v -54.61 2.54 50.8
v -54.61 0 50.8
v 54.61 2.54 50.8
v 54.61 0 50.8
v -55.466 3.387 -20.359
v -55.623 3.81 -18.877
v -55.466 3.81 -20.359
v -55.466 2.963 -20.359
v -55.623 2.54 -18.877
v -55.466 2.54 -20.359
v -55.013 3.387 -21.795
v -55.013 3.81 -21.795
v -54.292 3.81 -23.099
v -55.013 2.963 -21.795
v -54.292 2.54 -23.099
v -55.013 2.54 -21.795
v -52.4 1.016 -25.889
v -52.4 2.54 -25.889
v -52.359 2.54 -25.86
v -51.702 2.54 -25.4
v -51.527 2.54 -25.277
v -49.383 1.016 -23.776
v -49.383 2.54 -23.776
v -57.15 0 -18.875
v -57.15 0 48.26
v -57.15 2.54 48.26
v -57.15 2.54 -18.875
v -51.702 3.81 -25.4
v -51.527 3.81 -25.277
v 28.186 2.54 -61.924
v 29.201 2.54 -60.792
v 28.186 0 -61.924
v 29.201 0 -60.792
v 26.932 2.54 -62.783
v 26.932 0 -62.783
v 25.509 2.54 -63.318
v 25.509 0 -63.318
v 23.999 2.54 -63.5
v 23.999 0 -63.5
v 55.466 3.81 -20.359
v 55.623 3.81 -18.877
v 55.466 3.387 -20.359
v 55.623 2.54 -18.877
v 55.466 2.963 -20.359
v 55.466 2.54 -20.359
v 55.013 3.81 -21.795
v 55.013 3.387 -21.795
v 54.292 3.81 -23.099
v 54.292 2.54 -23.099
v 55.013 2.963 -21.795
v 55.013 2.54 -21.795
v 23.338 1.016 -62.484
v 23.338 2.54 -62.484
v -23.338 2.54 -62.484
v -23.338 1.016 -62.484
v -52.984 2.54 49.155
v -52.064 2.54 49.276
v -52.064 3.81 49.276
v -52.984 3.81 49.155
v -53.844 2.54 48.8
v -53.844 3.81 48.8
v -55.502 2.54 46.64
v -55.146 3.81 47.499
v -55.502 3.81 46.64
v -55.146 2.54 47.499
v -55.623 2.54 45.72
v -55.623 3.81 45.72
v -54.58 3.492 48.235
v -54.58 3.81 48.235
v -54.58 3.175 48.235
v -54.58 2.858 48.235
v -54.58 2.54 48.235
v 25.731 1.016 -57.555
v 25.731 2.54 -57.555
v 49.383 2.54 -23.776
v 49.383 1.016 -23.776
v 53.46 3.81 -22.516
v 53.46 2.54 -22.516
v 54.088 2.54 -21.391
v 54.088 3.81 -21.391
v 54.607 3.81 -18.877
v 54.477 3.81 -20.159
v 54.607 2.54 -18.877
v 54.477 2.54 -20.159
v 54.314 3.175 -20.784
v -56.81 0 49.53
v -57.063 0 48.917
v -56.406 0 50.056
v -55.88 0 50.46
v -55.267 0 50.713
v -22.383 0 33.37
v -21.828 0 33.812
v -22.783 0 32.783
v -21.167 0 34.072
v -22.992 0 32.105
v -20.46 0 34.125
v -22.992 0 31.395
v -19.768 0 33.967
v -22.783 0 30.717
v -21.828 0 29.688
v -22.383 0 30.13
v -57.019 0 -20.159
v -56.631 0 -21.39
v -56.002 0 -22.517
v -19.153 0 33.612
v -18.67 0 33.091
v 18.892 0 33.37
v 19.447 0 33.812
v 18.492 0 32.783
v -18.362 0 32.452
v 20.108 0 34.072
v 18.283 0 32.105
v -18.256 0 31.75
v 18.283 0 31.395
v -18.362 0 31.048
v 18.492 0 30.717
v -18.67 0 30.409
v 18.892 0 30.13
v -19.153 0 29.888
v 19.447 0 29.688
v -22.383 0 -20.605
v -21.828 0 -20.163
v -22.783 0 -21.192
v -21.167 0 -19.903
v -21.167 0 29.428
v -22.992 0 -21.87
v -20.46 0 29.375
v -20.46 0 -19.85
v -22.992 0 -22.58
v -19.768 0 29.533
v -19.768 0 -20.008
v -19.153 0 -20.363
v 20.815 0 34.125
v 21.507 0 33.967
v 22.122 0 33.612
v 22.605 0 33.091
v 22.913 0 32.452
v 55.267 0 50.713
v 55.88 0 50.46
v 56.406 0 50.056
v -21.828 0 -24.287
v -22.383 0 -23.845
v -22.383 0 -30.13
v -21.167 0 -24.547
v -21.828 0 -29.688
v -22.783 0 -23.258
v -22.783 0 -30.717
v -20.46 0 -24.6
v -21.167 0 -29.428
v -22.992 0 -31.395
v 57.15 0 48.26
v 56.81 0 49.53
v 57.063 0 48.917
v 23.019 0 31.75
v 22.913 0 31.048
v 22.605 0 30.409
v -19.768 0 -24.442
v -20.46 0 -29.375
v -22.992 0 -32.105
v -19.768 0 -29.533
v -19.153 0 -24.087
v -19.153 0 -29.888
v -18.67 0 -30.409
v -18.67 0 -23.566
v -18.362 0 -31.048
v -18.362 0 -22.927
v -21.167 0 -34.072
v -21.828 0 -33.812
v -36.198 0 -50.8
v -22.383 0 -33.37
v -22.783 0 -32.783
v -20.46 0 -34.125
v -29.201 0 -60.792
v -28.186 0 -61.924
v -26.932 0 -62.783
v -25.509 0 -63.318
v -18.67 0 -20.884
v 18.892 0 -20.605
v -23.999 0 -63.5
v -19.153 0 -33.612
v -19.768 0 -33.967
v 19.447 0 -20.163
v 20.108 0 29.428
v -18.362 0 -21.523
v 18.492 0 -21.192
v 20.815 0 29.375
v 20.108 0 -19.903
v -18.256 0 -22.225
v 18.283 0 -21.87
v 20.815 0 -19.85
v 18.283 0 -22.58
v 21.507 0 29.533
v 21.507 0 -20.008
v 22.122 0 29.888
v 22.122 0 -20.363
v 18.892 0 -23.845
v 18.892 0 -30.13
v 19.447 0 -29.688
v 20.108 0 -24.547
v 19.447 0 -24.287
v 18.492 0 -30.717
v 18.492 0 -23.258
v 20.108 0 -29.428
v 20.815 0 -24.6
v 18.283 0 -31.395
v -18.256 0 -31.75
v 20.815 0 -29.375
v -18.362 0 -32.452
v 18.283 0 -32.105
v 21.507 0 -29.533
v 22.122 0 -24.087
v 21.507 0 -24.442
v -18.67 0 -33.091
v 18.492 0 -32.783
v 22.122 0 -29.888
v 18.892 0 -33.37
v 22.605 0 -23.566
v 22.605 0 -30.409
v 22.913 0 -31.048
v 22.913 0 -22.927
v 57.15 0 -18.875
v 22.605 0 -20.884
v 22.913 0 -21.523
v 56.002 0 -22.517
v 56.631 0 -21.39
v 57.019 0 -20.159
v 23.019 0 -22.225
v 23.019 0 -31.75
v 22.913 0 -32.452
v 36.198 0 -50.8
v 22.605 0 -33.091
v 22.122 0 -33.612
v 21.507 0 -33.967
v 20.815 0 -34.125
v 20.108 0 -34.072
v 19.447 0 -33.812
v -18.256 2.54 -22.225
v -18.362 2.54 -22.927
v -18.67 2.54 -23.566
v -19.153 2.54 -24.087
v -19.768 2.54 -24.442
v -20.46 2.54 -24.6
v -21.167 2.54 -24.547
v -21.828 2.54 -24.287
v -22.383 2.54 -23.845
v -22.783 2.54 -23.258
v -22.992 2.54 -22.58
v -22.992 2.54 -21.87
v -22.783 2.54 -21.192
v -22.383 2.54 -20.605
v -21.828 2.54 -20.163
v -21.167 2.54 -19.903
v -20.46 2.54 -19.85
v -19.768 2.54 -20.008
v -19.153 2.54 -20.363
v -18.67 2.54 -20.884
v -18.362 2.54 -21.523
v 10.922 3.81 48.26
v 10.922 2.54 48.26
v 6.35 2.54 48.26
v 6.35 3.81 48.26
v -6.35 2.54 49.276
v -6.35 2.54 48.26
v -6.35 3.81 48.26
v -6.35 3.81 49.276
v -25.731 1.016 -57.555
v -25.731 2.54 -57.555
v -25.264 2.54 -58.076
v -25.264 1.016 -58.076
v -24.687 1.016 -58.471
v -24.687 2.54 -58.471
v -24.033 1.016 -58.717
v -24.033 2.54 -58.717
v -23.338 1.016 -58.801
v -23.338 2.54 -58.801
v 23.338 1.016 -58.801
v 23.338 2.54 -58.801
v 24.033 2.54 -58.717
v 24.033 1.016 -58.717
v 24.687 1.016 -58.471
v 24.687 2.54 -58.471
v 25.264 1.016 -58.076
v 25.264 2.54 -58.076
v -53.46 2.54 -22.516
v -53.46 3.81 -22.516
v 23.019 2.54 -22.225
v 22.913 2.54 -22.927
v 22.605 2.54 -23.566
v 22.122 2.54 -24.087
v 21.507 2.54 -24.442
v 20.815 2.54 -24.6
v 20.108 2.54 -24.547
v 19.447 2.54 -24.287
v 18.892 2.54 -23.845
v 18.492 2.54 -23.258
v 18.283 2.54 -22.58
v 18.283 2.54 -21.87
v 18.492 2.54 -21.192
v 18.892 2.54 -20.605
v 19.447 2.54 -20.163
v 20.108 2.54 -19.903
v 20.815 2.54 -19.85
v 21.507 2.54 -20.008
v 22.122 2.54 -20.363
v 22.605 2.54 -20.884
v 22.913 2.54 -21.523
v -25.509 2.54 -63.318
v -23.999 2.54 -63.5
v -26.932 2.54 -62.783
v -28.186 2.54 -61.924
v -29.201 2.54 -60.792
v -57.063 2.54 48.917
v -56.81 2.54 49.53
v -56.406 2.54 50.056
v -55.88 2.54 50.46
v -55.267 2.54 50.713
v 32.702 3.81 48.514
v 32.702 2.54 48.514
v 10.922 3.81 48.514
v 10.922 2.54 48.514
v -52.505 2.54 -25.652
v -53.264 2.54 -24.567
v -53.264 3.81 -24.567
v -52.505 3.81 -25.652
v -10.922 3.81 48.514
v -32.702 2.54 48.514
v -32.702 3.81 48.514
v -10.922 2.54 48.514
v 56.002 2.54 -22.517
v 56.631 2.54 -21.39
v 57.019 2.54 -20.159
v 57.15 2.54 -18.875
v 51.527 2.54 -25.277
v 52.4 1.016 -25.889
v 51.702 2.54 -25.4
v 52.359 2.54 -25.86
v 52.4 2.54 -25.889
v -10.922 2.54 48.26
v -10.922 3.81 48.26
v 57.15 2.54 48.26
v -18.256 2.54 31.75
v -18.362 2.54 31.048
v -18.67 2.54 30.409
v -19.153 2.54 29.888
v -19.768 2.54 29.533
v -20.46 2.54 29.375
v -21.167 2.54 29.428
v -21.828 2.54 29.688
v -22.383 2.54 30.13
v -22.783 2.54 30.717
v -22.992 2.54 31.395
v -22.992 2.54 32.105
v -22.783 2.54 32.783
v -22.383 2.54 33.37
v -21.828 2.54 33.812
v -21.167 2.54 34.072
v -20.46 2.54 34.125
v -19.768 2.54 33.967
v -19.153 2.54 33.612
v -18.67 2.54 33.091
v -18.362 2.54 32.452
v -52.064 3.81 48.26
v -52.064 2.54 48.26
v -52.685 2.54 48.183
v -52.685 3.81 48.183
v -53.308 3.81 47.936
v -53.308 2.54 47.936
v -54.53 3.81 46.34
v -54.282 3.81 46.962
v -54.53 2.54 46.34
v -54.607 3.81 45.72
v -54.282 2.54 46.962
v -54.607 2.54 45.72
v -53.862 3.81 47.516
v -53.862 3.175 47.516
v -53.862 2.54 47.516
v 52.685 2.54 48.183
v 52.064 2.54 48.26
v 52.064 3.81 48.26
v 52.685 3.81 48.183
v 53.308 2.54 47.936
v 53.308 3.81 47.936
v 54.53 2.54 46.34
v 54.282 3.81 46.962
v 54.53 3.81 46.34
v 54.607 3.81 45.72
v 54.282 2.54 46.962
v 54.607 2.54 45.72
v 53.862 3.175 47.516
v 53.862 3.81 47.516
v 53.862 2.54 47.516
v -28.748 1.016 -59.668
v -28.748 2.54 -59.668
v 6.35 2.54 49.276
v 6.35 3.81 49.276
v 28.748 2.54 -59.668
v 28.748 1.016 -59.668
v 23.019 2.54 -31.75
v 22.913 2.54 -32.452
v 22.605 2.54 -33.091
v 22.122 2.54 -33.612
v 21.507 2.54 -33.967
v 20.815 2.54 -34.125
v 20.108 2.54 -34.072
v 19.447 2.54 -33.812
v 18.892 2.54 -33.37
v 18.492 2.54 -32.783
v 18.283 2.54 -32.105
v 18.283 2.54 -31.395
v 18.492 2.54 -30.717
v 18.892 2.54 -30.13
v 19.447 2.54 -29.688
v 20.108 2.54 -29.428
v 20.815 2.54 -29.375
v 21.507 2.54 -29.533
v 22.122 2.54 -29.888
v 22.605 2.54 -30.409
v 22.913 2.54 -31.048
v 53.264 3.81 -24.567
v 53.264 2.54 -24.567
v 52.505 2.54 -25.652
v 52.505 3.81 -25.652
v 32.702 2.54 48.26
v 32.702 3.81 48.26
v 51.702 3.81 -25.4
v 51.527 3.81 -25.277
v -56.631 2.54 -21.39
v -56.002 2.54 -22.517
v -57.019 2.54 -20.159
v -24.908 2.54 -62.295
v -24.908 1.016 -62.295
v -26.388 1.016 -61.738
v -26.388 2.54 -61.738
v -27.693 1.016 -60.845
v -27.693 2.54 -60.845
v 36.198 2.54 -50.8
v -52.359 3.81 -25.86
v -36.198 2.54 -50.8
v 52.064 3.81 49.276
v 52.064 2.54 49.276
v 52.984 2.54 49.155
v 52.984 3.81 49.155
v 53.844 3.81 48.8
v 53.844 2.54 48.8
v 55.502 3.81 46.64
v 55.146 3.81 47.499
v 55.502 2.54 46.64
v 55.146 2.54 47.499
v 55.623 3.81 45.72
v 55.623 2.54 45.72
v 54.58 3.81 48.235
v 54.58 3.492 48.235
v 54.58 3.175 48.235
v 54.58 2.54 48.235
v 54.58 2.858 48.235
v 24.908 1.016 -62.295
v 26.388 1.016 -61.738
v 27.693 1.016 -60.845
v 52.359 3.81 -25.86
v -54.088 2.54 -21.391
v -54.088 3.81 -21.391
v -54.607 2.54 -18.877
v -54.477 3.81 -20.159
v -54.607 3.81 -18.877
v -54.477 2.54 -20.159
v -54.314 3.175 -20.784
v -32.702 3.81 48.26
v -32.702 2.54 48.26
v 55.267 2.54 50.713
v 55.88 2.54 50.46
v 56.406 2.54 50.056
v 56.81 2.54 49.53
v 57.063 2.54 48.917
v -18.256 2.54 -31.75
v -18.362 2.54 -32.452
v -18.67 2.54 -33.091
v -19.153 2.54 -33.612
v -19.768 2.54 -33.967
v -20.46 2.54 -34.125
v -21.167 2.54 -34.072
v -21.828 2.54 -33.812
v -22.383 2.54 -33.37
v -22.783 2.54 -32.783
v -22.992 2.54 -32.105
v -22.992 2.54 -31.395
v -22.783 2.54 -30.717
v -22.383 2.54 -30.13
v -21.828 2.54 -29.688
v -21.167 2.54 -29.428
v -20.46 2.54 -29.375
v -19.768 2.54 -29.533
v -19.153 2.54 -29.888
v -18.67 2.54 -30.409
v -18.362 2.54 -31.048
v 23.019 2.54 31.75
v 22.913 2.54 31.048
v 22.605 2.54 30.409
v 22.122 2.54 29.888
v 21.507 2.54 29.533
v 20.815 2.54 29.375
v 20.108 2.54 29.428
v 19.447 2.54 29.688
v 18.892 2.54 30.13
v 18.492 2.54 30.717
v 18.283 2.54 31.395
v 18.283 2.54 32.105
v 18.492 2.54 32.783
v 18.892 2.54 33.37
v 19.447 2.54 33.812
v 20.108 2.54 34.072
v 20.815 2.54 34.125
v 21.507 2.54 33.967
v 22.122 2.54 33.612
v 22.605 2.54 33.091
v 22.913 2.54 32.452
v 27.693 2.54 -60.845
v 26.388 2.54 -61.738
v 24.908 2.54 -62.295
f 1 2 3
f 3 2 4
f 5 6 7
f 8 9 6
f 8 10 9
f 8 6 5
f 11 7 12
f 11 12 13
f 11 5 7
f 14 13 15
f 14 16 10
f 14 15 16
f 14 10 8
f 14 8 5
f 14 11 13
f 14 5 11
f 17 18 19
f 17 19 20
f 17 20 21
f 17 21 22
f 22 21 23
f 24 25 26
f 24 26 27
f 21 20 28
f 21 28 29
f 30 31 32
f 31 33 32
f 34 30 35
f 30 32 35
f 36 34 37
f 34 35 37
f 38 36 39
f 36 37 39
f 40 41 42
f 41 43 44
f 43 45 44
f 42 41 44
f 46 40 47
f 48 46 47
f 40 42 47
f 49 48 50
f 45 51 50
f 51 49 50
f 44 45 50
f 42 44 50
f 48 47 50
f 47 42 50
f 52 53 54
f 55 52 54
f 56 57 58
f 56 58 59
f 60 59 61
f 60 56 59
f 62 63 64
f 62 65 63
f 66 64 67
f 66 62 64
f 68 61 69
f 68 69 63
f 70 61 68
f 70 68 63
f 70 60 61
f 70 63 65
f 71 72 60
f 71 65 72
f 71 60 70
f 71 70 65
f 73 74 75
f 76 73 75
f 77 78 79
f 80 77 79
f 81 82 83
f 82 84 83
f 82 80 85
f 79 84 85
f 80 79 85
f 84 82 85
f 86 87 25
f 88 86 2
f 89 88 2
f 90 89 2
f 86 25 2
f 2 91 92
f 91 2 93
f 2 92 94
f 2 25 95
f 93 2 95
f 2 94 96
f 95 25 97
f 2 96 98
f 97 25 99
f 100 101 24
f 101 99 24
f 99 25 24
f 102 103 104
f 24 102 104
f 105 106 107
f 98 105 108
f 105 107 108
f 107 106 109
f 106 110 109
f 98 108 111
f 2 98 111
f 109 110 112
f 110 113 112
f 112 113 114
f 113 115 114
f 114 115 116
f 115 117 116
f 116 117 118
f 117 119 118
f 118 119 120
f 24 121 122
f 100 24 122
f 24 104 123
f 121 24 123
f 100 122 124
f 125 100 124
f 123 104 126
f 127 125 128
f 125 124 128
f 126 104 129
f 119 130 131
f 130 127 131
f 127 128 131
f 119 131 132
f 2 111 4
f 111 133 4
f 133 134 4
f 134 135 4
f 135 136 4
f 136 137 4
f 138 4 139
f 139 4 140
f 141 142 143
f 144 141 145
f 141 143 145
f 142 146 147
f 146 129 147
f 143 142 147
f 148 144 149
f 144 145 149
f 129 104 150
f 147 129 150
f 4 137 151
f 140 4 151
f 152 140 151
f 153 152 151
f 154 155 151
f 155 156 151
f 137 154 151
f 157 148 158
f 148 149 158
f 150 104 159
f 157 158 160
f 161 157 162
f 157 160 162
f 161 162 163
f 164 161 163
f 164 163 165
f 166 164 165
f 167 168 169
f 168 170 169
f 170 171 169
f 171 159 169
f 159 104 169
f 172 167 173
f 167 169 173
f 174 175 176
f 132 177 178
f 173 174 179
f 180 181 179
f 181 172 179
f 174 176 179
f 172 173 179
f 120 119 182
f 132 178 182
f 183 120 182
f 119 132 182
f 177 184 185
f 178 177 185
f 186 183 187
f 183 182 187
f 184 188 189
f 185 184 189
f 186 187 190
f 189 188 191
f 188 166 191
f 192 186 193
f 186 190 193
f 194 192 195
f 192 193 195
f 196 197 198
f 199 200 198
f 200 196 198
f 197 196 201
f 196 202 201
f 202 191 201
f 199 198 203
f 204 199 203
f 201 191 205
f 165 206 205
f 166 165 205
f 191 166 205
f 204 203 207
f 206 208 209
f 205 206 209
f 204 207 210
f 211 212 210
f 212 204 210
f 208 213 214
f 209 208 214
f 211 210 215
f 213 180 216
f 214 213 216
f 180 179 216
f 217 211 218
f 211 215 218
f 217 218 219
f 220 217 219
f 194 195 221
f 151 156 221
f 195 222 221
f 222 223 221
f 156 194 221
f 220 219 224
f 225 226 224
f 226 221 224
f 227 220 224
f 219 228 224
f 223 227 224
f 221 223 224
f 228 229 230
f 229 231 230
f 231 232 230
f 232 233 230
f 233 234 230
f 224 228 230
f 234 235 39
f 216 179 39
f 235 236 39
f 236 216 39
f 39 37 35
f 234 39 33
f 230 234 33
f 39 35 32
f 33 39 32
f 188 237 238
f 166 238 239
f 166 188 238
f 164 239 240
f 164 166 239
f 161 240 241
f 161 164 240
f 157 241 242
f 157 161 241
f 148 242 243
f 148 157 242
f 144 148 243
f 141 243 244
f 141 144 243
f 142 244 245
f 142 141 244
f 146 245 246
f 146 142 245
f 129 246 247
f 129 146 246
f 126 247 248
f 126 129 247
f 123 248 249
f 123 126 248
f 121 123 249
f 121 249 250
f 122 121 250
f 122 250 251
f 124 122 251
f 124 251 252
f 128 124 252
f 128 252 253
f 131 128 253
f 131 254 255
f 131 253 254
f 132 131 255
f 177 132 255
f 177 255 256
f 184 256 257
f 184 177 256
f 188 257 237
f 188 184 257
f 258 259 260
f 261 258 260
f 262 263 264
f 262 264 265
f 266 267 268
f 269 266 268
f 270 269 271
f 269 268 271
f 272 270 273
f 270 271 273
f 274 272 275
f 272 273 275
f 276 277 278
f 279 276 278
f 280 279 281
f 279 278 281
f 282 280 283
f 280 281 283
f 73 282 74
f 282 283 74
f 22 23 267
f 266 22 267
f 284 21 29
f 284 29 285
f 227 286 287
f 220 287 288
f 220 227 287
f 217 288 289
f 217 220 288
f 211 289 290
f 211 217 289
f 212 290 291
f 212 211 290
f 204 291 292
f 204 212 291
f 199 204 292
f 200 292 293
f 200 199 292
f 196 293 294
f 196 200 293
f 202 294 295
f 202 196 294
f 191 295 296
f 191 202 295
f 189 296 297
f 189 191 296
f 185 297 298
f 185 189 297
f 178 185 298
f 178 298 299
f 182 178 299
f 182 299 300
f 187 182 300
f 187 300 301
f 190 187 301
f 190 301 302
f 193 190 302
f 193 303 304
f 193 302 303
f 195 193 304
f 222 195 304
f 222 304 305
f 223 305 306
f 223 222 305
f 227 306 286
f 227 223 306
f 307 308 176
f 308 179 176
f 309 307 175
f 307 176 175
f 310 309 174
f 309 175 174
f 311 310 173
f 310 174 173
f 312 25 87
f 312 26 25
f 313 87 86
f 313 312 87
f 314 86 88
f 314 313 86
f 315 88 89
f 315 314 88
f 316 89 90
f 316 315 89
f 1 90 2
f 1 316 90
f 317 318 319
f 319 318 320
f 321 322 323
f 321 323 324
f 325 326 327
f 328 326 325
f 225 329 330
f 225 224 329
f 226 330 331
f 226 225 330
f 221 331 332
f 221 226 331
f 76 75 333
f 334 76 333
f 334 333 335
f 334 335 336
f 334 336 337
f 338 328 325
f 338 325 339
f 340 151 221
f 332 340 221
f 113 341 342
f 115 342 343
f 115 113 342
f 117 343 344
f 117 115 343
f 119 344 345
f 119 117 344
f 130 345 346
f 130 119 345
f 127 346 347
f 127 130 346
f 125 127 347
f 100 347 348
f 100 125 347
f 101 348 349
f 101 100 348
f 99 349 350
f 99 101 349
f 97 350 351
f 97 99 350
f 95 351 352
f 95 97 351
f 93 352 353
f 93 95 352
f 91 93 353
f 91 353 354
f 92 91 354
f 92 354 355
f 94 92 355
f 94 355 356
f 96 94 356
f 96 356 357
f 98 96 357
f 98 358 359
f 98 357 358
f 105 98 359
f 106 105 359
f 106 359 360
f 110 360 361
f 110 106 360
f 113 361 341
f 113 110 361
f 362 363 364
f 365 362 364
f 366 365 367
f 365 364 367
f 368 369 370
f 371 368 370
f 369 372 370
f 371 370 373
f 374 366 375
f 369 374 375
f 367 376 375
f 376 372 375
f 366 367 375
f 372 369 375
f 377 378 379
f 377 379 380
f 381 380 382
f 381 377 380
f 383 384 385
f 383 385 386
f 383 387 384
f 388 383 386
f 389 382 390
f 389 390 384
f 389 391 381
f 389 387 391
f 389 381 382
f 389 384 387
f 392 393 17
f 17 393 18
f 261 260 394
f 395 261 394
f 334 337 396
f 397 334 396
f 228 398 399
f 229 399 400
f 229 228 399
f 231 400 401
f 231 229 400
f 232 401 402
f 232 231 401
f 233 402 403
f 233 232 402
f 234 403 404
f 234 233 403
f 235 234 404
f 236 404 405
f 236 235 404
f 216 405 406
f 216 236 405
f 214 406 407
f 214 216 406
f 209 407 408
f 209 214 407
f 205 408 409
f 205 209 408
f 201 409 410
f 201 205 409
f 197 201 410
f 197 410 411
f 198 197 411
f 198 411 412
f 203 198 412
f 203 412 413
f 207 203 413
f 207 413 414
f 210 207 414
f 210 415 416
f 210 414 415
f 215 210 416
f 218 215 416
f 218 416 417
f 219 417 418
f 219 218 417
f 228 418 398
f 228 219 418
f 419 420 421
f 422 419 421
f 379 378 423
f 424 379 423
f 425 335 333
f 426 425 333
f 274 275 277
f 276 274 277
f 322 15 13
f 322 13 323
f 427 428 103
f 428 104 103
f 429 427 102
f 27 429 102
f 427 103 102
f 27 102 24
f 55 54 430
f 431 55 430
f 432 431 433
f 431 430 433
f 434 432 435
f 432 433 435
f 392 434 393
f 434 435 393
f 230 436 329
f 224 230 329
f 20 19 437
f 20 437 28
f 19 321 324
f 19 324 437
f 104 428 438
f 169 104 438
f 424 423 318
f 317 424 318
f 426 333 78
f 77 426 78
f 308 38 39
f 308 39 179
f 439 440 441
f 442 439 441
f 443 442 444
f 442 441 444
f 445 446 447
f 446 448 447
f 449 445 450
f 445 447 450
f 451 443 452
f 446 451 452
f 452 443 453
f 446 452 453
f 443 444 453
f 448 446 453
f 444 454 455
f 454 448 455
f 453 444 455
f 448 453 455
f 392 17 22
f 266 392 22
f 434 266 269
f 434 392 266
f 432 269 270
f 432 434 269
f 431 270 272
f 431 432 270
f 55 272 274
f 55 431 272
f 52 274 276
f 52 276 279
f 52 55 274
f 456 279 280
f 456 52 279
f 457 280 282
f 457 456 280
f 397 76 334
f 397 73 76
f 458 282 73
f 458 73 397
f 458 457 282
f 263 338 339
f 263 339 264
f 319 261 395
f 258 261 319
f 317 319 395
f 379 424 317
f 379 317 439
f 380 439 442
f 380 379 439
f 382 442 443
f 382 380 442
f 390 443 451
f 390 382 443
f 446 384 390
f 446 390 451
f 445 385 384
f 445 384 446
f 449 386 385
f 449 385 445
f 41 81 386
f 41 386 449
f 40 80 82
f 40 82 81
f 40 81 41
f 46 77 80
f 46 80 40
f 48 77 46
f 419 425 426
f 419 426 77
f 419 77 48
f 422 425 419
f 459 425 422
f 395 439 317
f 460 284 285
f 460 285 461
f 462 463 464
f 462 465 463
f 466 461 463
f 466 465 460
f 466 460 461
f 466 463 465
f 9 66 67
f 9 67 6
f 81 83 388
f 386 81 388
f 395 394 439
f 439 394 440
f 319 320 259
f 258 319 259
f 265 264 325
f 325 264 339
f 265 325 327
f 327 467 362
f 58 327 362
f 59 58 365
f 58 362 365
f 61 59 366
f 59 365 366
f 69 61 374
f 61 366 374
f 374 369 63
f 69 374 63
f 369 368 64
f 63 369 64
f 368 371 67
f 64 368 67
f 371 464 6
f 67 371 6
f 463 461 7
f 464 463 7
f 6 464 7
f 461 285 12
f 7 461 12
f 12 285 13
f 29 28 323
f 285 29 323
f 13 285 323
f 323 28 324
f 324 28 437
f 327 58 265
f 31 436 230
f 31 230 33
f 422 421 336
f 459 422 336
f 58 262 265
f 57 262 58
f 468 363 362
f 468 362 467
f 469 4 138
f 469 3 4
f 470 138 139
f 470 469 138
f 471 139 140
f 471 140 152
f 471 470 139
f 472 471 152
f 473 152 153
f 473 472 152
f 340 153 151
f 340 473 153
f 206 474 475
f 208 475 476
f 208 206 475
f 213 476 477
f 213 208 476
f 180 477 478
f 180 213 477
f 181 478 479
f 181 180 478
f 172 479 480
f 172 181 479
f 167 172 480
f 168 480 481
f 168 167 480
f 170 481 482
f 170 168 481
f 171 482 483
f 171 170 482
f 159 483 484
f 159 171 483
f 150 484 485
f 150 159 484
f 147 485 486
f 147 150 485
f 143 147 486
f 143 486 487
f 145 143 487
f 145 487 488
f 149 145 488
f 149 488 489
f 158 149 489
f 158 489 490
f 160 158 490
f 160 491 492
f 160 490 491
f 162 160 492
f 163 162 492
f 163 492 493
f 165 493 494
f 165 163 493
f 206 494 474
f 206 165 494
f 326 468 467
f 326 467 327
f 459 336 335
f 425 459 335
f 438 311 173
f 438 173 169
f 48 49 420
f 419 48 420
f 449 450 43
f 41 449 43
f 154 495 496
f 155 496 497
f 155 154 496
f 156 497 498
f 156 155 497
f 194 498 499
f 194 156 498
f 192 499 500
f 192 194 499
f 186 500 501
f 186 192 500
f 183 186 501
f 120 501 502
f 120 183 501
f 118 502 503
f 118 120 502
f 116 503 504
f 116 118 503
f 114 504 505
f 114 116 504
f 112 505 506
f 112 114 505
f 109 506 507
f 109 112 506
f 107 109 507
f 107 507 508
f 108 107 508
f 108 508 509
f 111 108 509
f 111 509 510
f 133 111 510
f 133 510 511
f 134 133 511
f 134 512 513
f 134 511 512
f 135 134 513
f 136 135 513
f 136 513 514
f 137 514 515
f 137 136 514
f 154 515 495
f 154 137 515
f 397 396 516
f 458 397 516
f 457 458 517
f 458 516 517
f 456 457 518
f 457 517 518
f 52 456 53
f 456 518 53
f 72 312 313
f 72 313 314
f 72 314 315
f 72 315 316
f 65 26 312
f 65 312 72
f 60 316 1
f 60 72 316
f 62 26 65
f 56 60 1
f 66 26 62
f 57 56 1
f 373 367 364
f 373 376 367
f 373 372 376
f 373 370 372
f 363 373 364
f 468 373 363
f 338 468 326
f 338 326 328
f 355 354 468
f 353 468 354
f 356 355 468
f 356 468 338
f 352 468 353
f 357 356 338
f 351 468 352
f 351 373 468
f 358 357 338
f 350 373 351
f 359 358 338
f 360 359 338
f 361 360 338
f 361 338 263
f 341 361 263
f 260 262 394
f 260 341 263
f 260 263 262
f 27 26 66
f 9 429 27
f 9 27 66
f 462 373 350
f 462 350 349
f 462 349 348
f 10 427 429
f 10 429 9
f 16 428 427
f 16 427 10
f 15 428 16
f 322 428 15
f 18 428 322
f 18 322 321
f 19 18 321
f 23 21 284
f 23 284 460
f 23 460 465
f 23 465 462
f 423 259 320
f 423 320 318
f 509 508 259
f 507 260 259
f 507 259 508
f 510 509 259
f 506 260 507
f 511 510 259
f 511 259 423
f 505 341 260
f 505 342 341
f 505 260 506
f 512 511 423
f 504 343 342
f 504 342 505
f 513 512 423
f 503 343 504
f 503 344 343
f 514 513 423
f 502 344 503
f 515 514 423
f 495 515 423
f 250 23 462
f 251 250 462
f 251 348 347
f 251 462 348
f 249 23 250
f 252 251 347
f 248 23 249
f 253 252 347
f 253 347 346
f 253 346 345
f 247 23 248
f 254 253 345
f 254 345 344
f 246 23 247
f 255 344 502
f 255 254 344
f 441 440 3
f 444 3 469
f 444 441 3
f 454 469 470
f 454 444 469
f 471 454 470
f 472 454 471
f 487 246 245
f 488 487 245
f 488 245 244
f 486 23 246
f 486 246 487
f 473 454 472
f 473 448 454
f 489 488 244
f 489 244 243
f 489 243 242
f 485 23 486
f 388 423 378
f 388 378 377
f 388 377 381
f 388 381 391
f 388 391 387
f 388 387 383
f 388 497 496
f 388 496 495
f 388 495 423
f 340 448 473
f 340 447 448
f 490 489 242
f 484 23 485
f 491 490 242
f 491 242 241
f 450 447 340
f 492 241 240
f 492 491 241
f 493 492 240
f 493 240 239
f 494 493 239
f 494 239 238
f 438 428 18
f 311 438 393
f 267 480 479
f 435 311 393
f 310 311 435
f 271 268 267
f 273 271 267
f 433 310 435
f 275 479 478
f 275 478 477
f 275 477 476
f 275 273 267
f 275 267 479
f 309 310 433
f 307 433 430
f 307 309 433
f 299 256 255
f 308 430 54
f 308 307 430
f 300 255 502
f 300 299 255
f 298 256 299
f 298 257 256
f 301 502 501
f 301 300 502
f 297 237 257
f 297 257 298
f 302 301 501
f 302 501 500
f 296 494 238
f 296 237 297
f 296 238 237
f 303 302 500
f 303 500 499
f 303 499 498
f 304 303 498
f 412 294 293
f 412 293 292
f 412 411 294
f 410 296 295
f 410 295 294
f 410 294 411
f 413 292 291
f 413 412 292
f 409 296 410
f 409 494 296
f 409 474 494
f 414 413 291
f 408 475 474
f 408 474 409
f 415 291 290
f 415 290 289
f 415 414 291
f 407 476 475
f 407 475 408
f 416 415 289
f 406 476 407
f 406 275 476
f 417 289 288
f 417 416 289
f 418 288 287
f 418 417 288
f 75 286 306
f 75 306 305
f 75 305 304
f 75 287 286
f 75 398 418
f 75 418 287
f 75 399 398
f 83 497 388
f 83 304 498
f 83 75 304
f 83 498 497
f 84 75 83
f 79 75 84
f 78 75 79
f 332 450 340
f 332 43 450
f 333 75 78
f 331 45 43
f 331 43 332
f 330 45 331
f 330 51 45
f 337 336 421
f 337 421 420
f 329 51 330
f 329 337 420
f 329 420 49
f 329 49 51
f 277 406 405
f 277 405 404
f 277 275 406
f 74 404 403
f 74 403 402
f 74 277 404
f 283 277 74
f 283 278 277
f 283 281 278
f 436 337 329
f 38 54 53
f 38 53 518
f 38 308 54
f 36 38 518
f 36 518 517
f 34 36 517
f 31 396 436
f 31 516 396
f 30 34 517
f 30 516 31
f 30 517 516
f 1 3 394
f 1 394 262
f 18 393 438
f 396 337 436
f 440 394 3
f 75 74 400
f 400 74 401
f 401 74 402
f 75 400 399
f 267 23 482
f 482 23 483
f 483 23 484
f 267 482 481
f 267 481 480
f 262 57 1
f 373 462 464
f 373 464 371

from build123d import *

# Parameters (mm, degrees)
SKETCH2_W               = 114.3
SKETCH2_H               = 101.6
BOSS_EXTRUDE1_DEPTH     = 2.54
SKETCH3_W               = 19.05
SKETCH3_H               = 38.1
BOSS_EXTRUDE2_DEPTH     = 2.54
TRUCKMOUNTINGHOLES_R    = 2.38125
CUT_EXTRUDE1_DEPTH      = 6.08
FILLET1_R               = 2.54
CUT_EXTRUDE3_DEPTH      = 3.54
CUT_EXTRUDE3_DEPTH_BACK = 3.54
BOSS_EXTRUDE3_DEPTH     = 2.54
CUT_EXTRUDE4_DEPTH      = 1.524
FILLET2_R               = 6.35
SKETCH8_W               = 22.225
SKETCH8_H               = 2.54
BOSS_EXTRUDE4_DEPTH     = 2.54
CUT_EXTRUDE5_DEPTH      = 2.54
SKETCH10_W              = 60.325
SKETCH10_H              = 101.6
CUT_EXTRUDE6_DEPTH      = 2.54
BOSS_EXTRUDE5_DEPTH     = 1.27


with BuildPart() as part:
    # Sketch2 → Boss-Extrude1 (new body)
    with BuildSketch(Plane(origin=(0, 0, 0), x_dir=(1, 0, 0), z_dir=(0, 1, 0))):
        Rectangle(SKETCH2_W, SKETCH2_H)
    extrude(amount=BOSS_EXTRUDE1_DEPTH)

    # Sketch3 → Boss-Extrude2 (add)
    with BuildSketch(Plane(origin=(0, 2.54, 0), x_dir=(1, 0, 0), z_dir=(0, 1, 0))):
        with Locations((-20.6375, -31.75)):
            Rectangle(SKETCH3_W, SKETCH3_H)
        with Locations((20.6375, -31.75)):
            Rectangle(SKETCH3_W, SKETCH3_H)
        Polygon((-30.1625, 41.705647627), (-30.1625, 12.7), (-11.1125, 12.7), (-11.1125, 50.8), (-23.794565913, 50.8), align=None)
        Polygon((11.1125, 50.8), (11.1125, 12.7), (30.1625, 12.7), (30.1625, 41.705647627), (23.794565913, 50.8), align=None)
    extrude(amount=BOSS_EXTRUDE2_DEPTH)

    # TruckMountingHoles → Cut-Extrude1 (cut, through all)
    with BuildSketch(Plane(origin=(0, 0, 0), x_dir=(1, 0, 0), z_dir=(0, 1, 0))):
        with Locations((-20.6375, 22.225)):
            Circle(TRUCKMOUNTINGHOLES_R)
        with Locations((-20.6375, 31.75)):
            Circle(TRUCKMOUNTINGHOLES_R)
        with Locations((20.6375, 31.75)):
            Circle(TRUCKMOUNTINGHOLES_R)
        with Locations((20.6375, 22.225)):
            Circle(TRUCKMOUNTINGHOLES_R)
        with Locations((20.6375, -31.75)):
            Circle(TRUCKMOUNTINGHOLES_R)
        with Locations((-20.6375, -31.75)):
            Circle(TRUCKMOUNTINGHOLES_R)
    extrude(amount=CUT_EXTRUDE1_DEPTH, mode=Mode.SUBTRACT)

    # Fillet1
    fillet1_edges = [part.edges().sort_by_distance(p)[0] for p in [
        (57.15, 1.27, 50.8),
        (-57.15, 1.27, 50.8),
        (-57.15, 1.27, -50.8),
        (57.15, 1.27, -50.8),
    ]]
    fillet(fillet1_edges, radius=FILLET1_R)

    # Sketch5 → Cut-Extrude3 (cut, two sides)
    with BuildSketch(Plane(origin=(0, 2.54, 0), x_dir=(1, 0, 0), z_dir=(0, 1, 0))) as cut_extrude3_sk:
        with BuildLine():
            Line((54.61, 50.8), (36.197635735, 50.8))
            Line((36.197635735, 50.8), (57.15, 20.876922739))
            Line((57.15, 20.876922739), (57.15, 48.26))
            ThreePointArc((57.15, 48.26), (56.406051224, 50.056051224), (54.61, 50.8))
        make_face()
        with BuildLine():
            Line((-57.15, 20.876922739), (-36.197635735, 50.8))
            Line((-36.197635735, 50.8), (-54.61, 50.8))
            ThreePointArc((-54.61, 50.8), (-56.406051224, 50.056051224), (-57.15, 48.26))
            Line((-57.15, 48.26), (-57.15, 20.876922739))
        make_face()
    extrude(amount=CUT_EXTRUDE3_DEPTH, mode=Mode.SUBTRACT)
    extrude(cut_extrude3_sk.sketch, amount=-CUT_EXTRUDE3_DEPTH_BACK, mode=Mode.SUBTRACT)

    # Sketch5<5> → Boss-Extrude3 (add)
    with BuildSketch(Plane(origin=(0, 2.54, 0), x_dir=(1, 0, 0), z_dir=(0, 1, 0))):
        Polygon((36.197635735, 50.8), (27.305, 63.5), (-27.305, 63.5), (-36.197635735, 50.8), (-25.500724295, 50.8), (-23.794565913, 50.8), (-11.1125, 50.8), (11.1125, 50.8), (23.794565913, 50.8), align=None)
    extrude(amount=-BOSS_EXTRUDE3_DEPTH)

    # Sketch6 → Cut-Extrude4 (cut)
    with BuildSketch(Plane(origin=(0, 2.54, 0), x_dir=(1, 0, 0), z_dir=(0, 1, 0))):
        with BuildLine():
            Line((49.383451528, 23.776246966), (52.400388507, 25.888728981))
            Line((52.400388507, 25.888728981), (28.747959175, 59.667898786))
            ThreePointArc((28.747959175, 59.667898786), (26.387666917, 61.737819542), (23.338279075, 62.484))
            Line((23.338279075, 62.484), (-23.338279075, 62.484))
            ThreePointArc((-23.338279075, 62.484), (-26.387666917, 61.737819542), (-28.747959175, 59.667898786))
            Line((-28.747959175, 59.667898786), (-52.400388507, 25.888728981))
            Line((-52.400388507, 25.888728981), (-49.383451528, 23.776246966))
            Line((-49.383451528, 23.776246966), (-25.731022196, 57.555416771))
            ThreePointArc((-25.731022196, 57.555416771), (-24.687046774, 58.470958644), (-23.338279075, 58.801))
            Line((-23.338279075, 58.801), (23.338279075, 58.801))
            ThreePointArc((23.338279075, 58.801), (24.687046774, 58.470958644), (25.731022196, 57.555416771))
            Line((25.731022196, 57.555416771), (49.383451528, 23.776246966))
        make_face()
    extrude(amount=-CUT_EXTRUDE4_DEPTH, mode=Mode.SUBTRACT)

    # Fillet2
    fillet2_edges = [part.edges().sort_by_distance(p)[0] for p in [
        (57.15, 1.27, -20.876922739),
        (-57.15, 1.27, -20.876922739),
        (-27.305, 1.27, -63.5),
        (27.305, 1.27, -63.5),
    ]]
    fillet(fillet2_edges, radius=FILLET2_R)

    # Sketch8 → Boss-Extrude4 (add)
    with BuildSketch(Plane(origin=(0, 2.54, 0), x_dir=(1, 0, 0), z_dir=(0, 1, 0))):
        with Locations((0, -49.53)):
            Rectangle(SKETCH8_W, SKETCH8_H)
    extrude(amount=BOSS_EXTRUDE4_DEPTH)

    # Sketch9 → Cut-Extrude5 (cut)
    with BuildSketch(Plane.XY.offset(50.8)):
        with BuildLine():
            Line((6.346056871, 5.08), (-6.346056871, 5.08))
            ThreePointArc((-6.346056871, 5.08), (-5.941945474, 4.247288898), (-5.08, 3.91))
            Line((-5.08, 3.91), (5.08, 3.91))
            ThreePointArc((5.08, 3.91), (5.941945474, 4.247288898), (6.346056871, 5.08))
        make_face()
    extrude(amount=-CUT_EXTRUDE5_DEPTH, mode=Mode.SUBTRACT)

    # Sketch10 → Cut-Extrude6 (cut)
    with BuildSketch(Plane(origin=(0, 5.08, 0), x_dir=(1, 0, 0), z_dir=(0, 1, 0))):
        Rectangle(SKETCH10_W, SKETCH10_H)
    extrude(amount=-CUT_EXTRUDE6_DEPTH, mode=Mode.SUBTRACT)

    # Sketch11 → Boss-Extrude5 (add)
    with BuildSketch(Plane(origin=(0, 2.54, 0), x_dir=(1, 0, 0), z_dir=(0, 1, 0))):
        with BuildLine():
            add(Edge.make_bspline(
                [(52.064454926, -49.276), (52.527212299, -49.276), (53.462925017, -49.090999134), (54.645555287, -48.299984177), (55.437822336, -47.118247374), (55.623227463, -46.182681141), (55.623227463, -45.72)],
                knots=[3.141592654, 3.141592654, 3.141592654, 3.141592654, 3.534291735, 3.926990817, 4.319689899, 4.71238898, 4.71238898, 4.71238898, 4.71238898], degree=3))
            Line((55.623227463, -45.72), (55.623227463, -44.409940581))
            add(Edge.make_bspline(
                [(55.623227463, -44.409940581), (55.455682863, -44.009381364), (55.203452495, -43.645913792), (54.861227463, -43.351588173)],
                knots=[5.070956634, 5.070956634, 5.070956634, 5.070956634, 5.421823055, 5.421823055, 5.421823055, 5.421823055], degree=3))
            Line((54.861227463, -43.351588173), (54.861227463, -45.72))
            add(Edge.make_bspline(
                [(54.861227463, -45.72), (54.861227463, -46.432957974), (54.264419916, -47.918029594), (52.777827726, -48.514), (52.064454926, -48.514)],
                knots=[1.570796327, 1.570796327, 1.570796327, 1.570796327, 2.35619449, 3.141592654, 3.141592654, 3.141592654, 3.141592654], degree=3))
            Line((52.064454926, -48.514), (49.69227773, -48.514))
            add(Edge.make_bspline(
                [(49.69227773, -48.514), (49.98720822, -48.856186046), (50.351337017, -49.108435697), (50.752582292, -49.276)],
                knots=[2.431141263, 2.431141263, 2.431141263, 2.431141263, 2.78255448, 2.78255448, 2.78255448, 2.78255448], degree=3))
            Line((50.752582292, -49.276), (52.064454926, -49.276))
        make_face()
        with BuildLine():
            add(Edge.make_bspline(
                [(55.623227463, -44.409940581), (55.455682863, -44.009381364), (55.203452495, -43.645913792), (54.861227463, -43.351588173)],
                knots=[5.070956634, 5.070956634, 5.070956634, 5.070956634, 5.421823055, 5.421823055, 5.421823055, 5.421823055], degree=3))
            Line((55.623227463, -44.409940581), (55.623227463, -34.698805774))
            Line((55.623227463, -34.698805774), (55.623227463, 17.084765836))
            add(Edge.make_bspline(
                [(54.861227463, 15.559588906), (55.205040884, 16.01706212), (55.456487689, 16.533521145), (55.623227463, 17.084765836)],
                knots=[-0.795165299, -0.795165299, -0.795165299, -0.795165299, -0.40392164, -0.40392164, -0.40392164, -0.40392164], degree=3))
            Line((54.861227463, 15.559588906), (54.861227463, -35.534958582))
            Line((54.861227463, -35.534958582), (54.861227463, -43.351588173))
        make_face()
        with BuildLine():
            Line((54.607227463, -35.821330198), (54.607227463, -43.157480027))
            add(Edge.make_bspline(
                [(54.861227463, -43.351588173), (54.781471113, -43.282994893), (54.696826846, -43.218156948), (54.607227463, -43.157480027)],
                knots=[5.421823055, 5.421823055, 5.421823055, 5.421823055, 5.503593302, 5.503593302, 5.503593302, 5.503593302], degree=3))
            Line((54.861227463, -43.351588173), (54.861227463, -35.534958582))
            Line((54.861227463, -35.534958582), (54.861227463, 15.559588906))
            add(Edge.make_bspline(
                [(54.607227463, 15.251351548), (54.69691799, 15.350728874), (54.781552882, 15.453575049), (54.861227463, 15.559588906)],
                knots=[-0.885831261, -0.885831261, -0.885831261, -0.885831261, -0.795165299, -0.795165299, -0.795165299, -0.795165299], degree=3))
            Line((54.607227463, 15.251351548), (54.607227463, -35.821330198))
        make_face()
        with BuildLine():
            add(Edge.make_bspline(
                [(54.861227463, -43.351588173), (54.781471113, -43.282994893), (54.696826846, -43.218156948), (54.607227463, -43.157480027)],
                knots=[5.421823055, 5.421823055, 5.421823055, 5.421823055, 5.503593302, 5.503593302, 5.503593302, 5.503593302], degree=3))
            Line((54.607227463, -43.157480027), (54.607227463, -45.72))
            add(Edge.make_bspline(
                [(52.064454926, -48.26), (54.607227463, -48.26), (54.607227463, -45.72)],
                knots=[1.570796327, 1.570796327, 1.570796327, 3.141592654, 3.141592654, 3.141592654], degree=2, weights=[1, 0.707106781, 1]))
            Line((52.064454926, -48.26), (49.497730822, -48.26))
            add(Edge.make_bspline(
                [(49.497730822, -48.26), (49.558549509, -48.349597111), (49.623533898, -48.434241613), (49.69227773, -48.514)],
                knots=[2.349232162, 2.349232162, 2.349232162, 2.349232162, 2.431141263, 2.431141263, 2.431141263, 2.431141263], degree=3))
            Line((49.69227773, -48.514), (52.064454926, -48.514))
            add(Edge.make_bspline(
                [(54.861227463, -45.72), (54.861227463, -46.432957974), (54.264419916, -47.918029594), (52.777827726, -48.514), (52.064454926, -48.514)],
                knots=[1.570796327, 1.570796327, 1.570796327, 1.570796327, 2.35619449, 3.141592654, 3.141592654, 3.141592654, 3.141592654], degree=3))
            Line((54.861227463, -45.72), (54.861227463, -43.351588173))
        make_face()
        with BuildLine():
            Line((41.039104509, -49.276), (50.752582292, -49.276))
            add(Edge.make_bspline(
                [(49.69227773, -48.514), (49.98720822, -48.856186046), (50.351337017, -49.108435697), (50.752582292, -49.276)],
                knots=[2.431141263, 2.431141263, 2.431141263, 2.431141263, 2.78255448, 2.78255448, 2.78255448, 2.78255448], degree=3))
            Line((49.69227773, -48.514), (41.877400806, -48.514))
            Line((41.877400806, -48.514), (32.7025, -48.514))
            Line((32.7025, -48.514), (27.86827623, -48.514))
            add(Edge.make_bspline(
                [(27.86827623, -48.514), (27.846578806, -48.767183697), (27.82498302, -49.021182908), (27.803489623, -49.276)],
                knots=[6.367915657, 6.367915657, 6.367915657, 6.367915657, 6.385943787, 6.385943787, 6.385943787, 6.385943787], degree=3))
            Line((27.803489623, -49.276), (32.7025, -49.276))
            Line((32.7025, -49.276), (41.039104509, -49.276))
        make_face()
        with BuildLine():
            add(Edge.make_bspline(
                [(54.861227463, 15.559588906), (55.205040884, 16.01706212), (55.456487689, 16.533521145), (55.623227463, 17.084765836)],
                knots=[-0.795165299, -0.795165299, -0.795165299, -0.795165299, -0.40392164, -0.40392164, -0.40392164, -0.40392164], degree=3))
            Line((55.623227463, 17.084765836), (55.623227463, 18.876688069))
            add(Edge.make_bspline(
                [(55.623227463, 18.876688069), (55.623227463, 20.352383987), (55.138231725, 21.889973031), (54.29188787, 23.098848758)],
                knots=[0, 0, 0, 0, 1, 1, 1, 1], degree=3))
            Line((54.29188787, 23.098848758), (53.263692187, 24.567472646))
            add(Edge.make_bspline(
                [(53.263692187, 24.567472646), (52.876307698, 24.87211251), (52.452799222, 25.12030497), (51.997969643, 25.296875514)],
                knots=[1.404144693, 1.404144693, 1.404144693, 1.404144693, 1.739017276, 1.739017276, 1.739017276, 1.739017276], degree=3))
            Line((51.997969643, 25.296875514), (51.880453354, 25.214589722))
            Line((51.880453354, 25.214589722), (53.66766489, 22.661825108))
            add(Edge.make_bspline(
                [(53.66766489, 22.661825108), (54.426407639, 21.578074471), (54.861227463, 20.199641583), (54.861227463, 18.876688069)],
                knots=[0, 0, 0, 0, 1, 1, 1, 1], degree=3))
            Line((54.861227463, 18.876688069), (54.861227463, 15.559588906))
        make_face()
        with BuildLine():
            Line((41.877400806, -48.514), (49.69227773, -48.514))
            add(Edge.make_bspline(
                [(49.497730822, -48.26), (49.558549509, -48.349597111), (49.623533898, -48.434241613), (49.69227773, -48.514)],
                knots=[2.349232162, 2.349232162, 2.349232162, 2.349232162, 2.431141263, 2.431141263, 2.431141263, 2.431141263], degree=3))
            Line((49.497730822, -48.26), (42.164507917, -48.26))
            Line((42.164507917, -48.26), (32.7025, -48.26))
            Line((32.7025, -48.26), (32.7025, -48.514))
            Line((32.7025, -48.514), (41.877400806, -48.514))
        make_face()
        with BuildLine():
            add(Edge.make_bspline(
                [(54.607227463, 15.251351548), (54.69691799, 15.350728874), (54.781552882, 15.453575049), (54.861227463, 15.559588906)],
                knots=[-0.885831261, -0.885831261, -0.885831261, -0.885831261, -0.795165299, -0.795165299, -0.795165299, -0.795165299], degree=3))
            Line((54.861227463, 15.559588906), (54.861227463, 18.876688069))
            add(Edge.make_bspline(
                [(53.66766489, 22.661825108), (54.426407639, 21.578074471), (54.861227463, 20.199641583), (54.861227463, 18.876688069)],
                knots=[0, 0, 0, 0, 1, 1, 1, 1], degree=3))
            Line((53.66766489, 22.661825108), (51.880453354, 25.214589722))
            Line((51.880453354, 25.214589722), (51.997969643, 25.296875514))
            add(Edge.make_bspline(
                [(51.997969643, 25.296875514), (51.900871398, 25.33457027), (51.802345698, 25.369000867), (51.702439272, 25.400019665)],
                knots=[1.739017276, 1.739017276, 1.739017276, 1.739017276, 1.810506779, 1.810506779, 1.810506779, 1.810506779], degree=3))
            Line((51.702439272, 25.400019665), (51.526714183, 25.276975634))
            Line((51.526714183, 25.276975634), (53.459590563, 22.516150558))
            add(Edge.make_bspline(
                [(53.459590563, 22.516150558), (53.833000013, 21.982790957), (54.11786933, 21.405096809), (54.50929647, 20.163665719), (54.607227463, 19.527775664), (54.607227463, 18.876688069)],
                knots=[0, 0, 0, 0, 0.5, 0.5, 1, 1, 1, 1], degree=3))
            Line((54.607227463, 18.876688069), (54.607227463, 15.251351548))
        make_face()
        with BuildLine():
            Line((6.604, -49.276), (27.803489623, -49.276))
            add(Edge.make_bspline(
                [(27.86827623, -48.514), (27.846578806, -48.767183697), (27.82498302, -49.021182908), (27.803489623, -49.276)],
                knots=[6.367915657, 6.367915657, 6.367915657, 6.367915657, 6.385943787, 6.385943787, 6.385943787, 6.385943787], degree=3))
            Line((27.86827623, -48.514), (10.922, -48.514))
            Line((10.922, -48.514), (6.604, -48.514))
            Line((6.604, -48.514), (6.604, -49.276))
        make_face()
        with BuildLine():
            add(Edge.make_bspline(
                [(53.263692187, 24.567472646), (52.876307698, 24.87211251), (52.452799222, 25.12030497), (51.997969643, 25.296875514)],
                knots=[1.404144693, 1.404144693, 1.404144693, 1.404144693, 1.739017276, 1.739017276, 1.739017276, 1.739017276], degree=3))
            Line((53.263692187, 24.567472646), (52.504647213, 25.651654967))
            Line((52.504647213, 25.651654967), (51.997969643, 25.296875514))
        make_face()
        Polygon((6.35, -49.276), (6.604, -49.276), (6.604, -48.514), (10.922, -48.514), (10.922, -48.26), (6.35, -48.26), align=None)
        with BuildLine():
            Line((51.997969643, 25.296875514), (52.504647213, 25.651654967))
            Line((52.504647213, 25.651654967), (52.358958798, 25.859719586))
            Line((52.358958798, 25.859719586), (51.702439272, 25.400019665))
            add(Edge.make_bspline(
                [(51.997969643, 25.296875514), (51.900871398, 25.33457027), (51.802345698, 25.369000867), (51.702439272, 25.400019665)],
                knots=[1.739017276, 1.739017276, 1.739017276, 1.739017276, 1.810506779, 1.810506779, 1.810506779, 1.810506779], degree=3))
        make_face()
    boss_extrude5 = extrude(amount=BOSS_EXTRUDE5_DEPTH)

    # Mirror1: Boss-Extrude5 across plane
    add(boss_extrude5.mirror(Plane(origin=(0, 0, 0), x_dir=(0, 0, 1), z_dir=(1, 0, 0))))


solid = part.part
